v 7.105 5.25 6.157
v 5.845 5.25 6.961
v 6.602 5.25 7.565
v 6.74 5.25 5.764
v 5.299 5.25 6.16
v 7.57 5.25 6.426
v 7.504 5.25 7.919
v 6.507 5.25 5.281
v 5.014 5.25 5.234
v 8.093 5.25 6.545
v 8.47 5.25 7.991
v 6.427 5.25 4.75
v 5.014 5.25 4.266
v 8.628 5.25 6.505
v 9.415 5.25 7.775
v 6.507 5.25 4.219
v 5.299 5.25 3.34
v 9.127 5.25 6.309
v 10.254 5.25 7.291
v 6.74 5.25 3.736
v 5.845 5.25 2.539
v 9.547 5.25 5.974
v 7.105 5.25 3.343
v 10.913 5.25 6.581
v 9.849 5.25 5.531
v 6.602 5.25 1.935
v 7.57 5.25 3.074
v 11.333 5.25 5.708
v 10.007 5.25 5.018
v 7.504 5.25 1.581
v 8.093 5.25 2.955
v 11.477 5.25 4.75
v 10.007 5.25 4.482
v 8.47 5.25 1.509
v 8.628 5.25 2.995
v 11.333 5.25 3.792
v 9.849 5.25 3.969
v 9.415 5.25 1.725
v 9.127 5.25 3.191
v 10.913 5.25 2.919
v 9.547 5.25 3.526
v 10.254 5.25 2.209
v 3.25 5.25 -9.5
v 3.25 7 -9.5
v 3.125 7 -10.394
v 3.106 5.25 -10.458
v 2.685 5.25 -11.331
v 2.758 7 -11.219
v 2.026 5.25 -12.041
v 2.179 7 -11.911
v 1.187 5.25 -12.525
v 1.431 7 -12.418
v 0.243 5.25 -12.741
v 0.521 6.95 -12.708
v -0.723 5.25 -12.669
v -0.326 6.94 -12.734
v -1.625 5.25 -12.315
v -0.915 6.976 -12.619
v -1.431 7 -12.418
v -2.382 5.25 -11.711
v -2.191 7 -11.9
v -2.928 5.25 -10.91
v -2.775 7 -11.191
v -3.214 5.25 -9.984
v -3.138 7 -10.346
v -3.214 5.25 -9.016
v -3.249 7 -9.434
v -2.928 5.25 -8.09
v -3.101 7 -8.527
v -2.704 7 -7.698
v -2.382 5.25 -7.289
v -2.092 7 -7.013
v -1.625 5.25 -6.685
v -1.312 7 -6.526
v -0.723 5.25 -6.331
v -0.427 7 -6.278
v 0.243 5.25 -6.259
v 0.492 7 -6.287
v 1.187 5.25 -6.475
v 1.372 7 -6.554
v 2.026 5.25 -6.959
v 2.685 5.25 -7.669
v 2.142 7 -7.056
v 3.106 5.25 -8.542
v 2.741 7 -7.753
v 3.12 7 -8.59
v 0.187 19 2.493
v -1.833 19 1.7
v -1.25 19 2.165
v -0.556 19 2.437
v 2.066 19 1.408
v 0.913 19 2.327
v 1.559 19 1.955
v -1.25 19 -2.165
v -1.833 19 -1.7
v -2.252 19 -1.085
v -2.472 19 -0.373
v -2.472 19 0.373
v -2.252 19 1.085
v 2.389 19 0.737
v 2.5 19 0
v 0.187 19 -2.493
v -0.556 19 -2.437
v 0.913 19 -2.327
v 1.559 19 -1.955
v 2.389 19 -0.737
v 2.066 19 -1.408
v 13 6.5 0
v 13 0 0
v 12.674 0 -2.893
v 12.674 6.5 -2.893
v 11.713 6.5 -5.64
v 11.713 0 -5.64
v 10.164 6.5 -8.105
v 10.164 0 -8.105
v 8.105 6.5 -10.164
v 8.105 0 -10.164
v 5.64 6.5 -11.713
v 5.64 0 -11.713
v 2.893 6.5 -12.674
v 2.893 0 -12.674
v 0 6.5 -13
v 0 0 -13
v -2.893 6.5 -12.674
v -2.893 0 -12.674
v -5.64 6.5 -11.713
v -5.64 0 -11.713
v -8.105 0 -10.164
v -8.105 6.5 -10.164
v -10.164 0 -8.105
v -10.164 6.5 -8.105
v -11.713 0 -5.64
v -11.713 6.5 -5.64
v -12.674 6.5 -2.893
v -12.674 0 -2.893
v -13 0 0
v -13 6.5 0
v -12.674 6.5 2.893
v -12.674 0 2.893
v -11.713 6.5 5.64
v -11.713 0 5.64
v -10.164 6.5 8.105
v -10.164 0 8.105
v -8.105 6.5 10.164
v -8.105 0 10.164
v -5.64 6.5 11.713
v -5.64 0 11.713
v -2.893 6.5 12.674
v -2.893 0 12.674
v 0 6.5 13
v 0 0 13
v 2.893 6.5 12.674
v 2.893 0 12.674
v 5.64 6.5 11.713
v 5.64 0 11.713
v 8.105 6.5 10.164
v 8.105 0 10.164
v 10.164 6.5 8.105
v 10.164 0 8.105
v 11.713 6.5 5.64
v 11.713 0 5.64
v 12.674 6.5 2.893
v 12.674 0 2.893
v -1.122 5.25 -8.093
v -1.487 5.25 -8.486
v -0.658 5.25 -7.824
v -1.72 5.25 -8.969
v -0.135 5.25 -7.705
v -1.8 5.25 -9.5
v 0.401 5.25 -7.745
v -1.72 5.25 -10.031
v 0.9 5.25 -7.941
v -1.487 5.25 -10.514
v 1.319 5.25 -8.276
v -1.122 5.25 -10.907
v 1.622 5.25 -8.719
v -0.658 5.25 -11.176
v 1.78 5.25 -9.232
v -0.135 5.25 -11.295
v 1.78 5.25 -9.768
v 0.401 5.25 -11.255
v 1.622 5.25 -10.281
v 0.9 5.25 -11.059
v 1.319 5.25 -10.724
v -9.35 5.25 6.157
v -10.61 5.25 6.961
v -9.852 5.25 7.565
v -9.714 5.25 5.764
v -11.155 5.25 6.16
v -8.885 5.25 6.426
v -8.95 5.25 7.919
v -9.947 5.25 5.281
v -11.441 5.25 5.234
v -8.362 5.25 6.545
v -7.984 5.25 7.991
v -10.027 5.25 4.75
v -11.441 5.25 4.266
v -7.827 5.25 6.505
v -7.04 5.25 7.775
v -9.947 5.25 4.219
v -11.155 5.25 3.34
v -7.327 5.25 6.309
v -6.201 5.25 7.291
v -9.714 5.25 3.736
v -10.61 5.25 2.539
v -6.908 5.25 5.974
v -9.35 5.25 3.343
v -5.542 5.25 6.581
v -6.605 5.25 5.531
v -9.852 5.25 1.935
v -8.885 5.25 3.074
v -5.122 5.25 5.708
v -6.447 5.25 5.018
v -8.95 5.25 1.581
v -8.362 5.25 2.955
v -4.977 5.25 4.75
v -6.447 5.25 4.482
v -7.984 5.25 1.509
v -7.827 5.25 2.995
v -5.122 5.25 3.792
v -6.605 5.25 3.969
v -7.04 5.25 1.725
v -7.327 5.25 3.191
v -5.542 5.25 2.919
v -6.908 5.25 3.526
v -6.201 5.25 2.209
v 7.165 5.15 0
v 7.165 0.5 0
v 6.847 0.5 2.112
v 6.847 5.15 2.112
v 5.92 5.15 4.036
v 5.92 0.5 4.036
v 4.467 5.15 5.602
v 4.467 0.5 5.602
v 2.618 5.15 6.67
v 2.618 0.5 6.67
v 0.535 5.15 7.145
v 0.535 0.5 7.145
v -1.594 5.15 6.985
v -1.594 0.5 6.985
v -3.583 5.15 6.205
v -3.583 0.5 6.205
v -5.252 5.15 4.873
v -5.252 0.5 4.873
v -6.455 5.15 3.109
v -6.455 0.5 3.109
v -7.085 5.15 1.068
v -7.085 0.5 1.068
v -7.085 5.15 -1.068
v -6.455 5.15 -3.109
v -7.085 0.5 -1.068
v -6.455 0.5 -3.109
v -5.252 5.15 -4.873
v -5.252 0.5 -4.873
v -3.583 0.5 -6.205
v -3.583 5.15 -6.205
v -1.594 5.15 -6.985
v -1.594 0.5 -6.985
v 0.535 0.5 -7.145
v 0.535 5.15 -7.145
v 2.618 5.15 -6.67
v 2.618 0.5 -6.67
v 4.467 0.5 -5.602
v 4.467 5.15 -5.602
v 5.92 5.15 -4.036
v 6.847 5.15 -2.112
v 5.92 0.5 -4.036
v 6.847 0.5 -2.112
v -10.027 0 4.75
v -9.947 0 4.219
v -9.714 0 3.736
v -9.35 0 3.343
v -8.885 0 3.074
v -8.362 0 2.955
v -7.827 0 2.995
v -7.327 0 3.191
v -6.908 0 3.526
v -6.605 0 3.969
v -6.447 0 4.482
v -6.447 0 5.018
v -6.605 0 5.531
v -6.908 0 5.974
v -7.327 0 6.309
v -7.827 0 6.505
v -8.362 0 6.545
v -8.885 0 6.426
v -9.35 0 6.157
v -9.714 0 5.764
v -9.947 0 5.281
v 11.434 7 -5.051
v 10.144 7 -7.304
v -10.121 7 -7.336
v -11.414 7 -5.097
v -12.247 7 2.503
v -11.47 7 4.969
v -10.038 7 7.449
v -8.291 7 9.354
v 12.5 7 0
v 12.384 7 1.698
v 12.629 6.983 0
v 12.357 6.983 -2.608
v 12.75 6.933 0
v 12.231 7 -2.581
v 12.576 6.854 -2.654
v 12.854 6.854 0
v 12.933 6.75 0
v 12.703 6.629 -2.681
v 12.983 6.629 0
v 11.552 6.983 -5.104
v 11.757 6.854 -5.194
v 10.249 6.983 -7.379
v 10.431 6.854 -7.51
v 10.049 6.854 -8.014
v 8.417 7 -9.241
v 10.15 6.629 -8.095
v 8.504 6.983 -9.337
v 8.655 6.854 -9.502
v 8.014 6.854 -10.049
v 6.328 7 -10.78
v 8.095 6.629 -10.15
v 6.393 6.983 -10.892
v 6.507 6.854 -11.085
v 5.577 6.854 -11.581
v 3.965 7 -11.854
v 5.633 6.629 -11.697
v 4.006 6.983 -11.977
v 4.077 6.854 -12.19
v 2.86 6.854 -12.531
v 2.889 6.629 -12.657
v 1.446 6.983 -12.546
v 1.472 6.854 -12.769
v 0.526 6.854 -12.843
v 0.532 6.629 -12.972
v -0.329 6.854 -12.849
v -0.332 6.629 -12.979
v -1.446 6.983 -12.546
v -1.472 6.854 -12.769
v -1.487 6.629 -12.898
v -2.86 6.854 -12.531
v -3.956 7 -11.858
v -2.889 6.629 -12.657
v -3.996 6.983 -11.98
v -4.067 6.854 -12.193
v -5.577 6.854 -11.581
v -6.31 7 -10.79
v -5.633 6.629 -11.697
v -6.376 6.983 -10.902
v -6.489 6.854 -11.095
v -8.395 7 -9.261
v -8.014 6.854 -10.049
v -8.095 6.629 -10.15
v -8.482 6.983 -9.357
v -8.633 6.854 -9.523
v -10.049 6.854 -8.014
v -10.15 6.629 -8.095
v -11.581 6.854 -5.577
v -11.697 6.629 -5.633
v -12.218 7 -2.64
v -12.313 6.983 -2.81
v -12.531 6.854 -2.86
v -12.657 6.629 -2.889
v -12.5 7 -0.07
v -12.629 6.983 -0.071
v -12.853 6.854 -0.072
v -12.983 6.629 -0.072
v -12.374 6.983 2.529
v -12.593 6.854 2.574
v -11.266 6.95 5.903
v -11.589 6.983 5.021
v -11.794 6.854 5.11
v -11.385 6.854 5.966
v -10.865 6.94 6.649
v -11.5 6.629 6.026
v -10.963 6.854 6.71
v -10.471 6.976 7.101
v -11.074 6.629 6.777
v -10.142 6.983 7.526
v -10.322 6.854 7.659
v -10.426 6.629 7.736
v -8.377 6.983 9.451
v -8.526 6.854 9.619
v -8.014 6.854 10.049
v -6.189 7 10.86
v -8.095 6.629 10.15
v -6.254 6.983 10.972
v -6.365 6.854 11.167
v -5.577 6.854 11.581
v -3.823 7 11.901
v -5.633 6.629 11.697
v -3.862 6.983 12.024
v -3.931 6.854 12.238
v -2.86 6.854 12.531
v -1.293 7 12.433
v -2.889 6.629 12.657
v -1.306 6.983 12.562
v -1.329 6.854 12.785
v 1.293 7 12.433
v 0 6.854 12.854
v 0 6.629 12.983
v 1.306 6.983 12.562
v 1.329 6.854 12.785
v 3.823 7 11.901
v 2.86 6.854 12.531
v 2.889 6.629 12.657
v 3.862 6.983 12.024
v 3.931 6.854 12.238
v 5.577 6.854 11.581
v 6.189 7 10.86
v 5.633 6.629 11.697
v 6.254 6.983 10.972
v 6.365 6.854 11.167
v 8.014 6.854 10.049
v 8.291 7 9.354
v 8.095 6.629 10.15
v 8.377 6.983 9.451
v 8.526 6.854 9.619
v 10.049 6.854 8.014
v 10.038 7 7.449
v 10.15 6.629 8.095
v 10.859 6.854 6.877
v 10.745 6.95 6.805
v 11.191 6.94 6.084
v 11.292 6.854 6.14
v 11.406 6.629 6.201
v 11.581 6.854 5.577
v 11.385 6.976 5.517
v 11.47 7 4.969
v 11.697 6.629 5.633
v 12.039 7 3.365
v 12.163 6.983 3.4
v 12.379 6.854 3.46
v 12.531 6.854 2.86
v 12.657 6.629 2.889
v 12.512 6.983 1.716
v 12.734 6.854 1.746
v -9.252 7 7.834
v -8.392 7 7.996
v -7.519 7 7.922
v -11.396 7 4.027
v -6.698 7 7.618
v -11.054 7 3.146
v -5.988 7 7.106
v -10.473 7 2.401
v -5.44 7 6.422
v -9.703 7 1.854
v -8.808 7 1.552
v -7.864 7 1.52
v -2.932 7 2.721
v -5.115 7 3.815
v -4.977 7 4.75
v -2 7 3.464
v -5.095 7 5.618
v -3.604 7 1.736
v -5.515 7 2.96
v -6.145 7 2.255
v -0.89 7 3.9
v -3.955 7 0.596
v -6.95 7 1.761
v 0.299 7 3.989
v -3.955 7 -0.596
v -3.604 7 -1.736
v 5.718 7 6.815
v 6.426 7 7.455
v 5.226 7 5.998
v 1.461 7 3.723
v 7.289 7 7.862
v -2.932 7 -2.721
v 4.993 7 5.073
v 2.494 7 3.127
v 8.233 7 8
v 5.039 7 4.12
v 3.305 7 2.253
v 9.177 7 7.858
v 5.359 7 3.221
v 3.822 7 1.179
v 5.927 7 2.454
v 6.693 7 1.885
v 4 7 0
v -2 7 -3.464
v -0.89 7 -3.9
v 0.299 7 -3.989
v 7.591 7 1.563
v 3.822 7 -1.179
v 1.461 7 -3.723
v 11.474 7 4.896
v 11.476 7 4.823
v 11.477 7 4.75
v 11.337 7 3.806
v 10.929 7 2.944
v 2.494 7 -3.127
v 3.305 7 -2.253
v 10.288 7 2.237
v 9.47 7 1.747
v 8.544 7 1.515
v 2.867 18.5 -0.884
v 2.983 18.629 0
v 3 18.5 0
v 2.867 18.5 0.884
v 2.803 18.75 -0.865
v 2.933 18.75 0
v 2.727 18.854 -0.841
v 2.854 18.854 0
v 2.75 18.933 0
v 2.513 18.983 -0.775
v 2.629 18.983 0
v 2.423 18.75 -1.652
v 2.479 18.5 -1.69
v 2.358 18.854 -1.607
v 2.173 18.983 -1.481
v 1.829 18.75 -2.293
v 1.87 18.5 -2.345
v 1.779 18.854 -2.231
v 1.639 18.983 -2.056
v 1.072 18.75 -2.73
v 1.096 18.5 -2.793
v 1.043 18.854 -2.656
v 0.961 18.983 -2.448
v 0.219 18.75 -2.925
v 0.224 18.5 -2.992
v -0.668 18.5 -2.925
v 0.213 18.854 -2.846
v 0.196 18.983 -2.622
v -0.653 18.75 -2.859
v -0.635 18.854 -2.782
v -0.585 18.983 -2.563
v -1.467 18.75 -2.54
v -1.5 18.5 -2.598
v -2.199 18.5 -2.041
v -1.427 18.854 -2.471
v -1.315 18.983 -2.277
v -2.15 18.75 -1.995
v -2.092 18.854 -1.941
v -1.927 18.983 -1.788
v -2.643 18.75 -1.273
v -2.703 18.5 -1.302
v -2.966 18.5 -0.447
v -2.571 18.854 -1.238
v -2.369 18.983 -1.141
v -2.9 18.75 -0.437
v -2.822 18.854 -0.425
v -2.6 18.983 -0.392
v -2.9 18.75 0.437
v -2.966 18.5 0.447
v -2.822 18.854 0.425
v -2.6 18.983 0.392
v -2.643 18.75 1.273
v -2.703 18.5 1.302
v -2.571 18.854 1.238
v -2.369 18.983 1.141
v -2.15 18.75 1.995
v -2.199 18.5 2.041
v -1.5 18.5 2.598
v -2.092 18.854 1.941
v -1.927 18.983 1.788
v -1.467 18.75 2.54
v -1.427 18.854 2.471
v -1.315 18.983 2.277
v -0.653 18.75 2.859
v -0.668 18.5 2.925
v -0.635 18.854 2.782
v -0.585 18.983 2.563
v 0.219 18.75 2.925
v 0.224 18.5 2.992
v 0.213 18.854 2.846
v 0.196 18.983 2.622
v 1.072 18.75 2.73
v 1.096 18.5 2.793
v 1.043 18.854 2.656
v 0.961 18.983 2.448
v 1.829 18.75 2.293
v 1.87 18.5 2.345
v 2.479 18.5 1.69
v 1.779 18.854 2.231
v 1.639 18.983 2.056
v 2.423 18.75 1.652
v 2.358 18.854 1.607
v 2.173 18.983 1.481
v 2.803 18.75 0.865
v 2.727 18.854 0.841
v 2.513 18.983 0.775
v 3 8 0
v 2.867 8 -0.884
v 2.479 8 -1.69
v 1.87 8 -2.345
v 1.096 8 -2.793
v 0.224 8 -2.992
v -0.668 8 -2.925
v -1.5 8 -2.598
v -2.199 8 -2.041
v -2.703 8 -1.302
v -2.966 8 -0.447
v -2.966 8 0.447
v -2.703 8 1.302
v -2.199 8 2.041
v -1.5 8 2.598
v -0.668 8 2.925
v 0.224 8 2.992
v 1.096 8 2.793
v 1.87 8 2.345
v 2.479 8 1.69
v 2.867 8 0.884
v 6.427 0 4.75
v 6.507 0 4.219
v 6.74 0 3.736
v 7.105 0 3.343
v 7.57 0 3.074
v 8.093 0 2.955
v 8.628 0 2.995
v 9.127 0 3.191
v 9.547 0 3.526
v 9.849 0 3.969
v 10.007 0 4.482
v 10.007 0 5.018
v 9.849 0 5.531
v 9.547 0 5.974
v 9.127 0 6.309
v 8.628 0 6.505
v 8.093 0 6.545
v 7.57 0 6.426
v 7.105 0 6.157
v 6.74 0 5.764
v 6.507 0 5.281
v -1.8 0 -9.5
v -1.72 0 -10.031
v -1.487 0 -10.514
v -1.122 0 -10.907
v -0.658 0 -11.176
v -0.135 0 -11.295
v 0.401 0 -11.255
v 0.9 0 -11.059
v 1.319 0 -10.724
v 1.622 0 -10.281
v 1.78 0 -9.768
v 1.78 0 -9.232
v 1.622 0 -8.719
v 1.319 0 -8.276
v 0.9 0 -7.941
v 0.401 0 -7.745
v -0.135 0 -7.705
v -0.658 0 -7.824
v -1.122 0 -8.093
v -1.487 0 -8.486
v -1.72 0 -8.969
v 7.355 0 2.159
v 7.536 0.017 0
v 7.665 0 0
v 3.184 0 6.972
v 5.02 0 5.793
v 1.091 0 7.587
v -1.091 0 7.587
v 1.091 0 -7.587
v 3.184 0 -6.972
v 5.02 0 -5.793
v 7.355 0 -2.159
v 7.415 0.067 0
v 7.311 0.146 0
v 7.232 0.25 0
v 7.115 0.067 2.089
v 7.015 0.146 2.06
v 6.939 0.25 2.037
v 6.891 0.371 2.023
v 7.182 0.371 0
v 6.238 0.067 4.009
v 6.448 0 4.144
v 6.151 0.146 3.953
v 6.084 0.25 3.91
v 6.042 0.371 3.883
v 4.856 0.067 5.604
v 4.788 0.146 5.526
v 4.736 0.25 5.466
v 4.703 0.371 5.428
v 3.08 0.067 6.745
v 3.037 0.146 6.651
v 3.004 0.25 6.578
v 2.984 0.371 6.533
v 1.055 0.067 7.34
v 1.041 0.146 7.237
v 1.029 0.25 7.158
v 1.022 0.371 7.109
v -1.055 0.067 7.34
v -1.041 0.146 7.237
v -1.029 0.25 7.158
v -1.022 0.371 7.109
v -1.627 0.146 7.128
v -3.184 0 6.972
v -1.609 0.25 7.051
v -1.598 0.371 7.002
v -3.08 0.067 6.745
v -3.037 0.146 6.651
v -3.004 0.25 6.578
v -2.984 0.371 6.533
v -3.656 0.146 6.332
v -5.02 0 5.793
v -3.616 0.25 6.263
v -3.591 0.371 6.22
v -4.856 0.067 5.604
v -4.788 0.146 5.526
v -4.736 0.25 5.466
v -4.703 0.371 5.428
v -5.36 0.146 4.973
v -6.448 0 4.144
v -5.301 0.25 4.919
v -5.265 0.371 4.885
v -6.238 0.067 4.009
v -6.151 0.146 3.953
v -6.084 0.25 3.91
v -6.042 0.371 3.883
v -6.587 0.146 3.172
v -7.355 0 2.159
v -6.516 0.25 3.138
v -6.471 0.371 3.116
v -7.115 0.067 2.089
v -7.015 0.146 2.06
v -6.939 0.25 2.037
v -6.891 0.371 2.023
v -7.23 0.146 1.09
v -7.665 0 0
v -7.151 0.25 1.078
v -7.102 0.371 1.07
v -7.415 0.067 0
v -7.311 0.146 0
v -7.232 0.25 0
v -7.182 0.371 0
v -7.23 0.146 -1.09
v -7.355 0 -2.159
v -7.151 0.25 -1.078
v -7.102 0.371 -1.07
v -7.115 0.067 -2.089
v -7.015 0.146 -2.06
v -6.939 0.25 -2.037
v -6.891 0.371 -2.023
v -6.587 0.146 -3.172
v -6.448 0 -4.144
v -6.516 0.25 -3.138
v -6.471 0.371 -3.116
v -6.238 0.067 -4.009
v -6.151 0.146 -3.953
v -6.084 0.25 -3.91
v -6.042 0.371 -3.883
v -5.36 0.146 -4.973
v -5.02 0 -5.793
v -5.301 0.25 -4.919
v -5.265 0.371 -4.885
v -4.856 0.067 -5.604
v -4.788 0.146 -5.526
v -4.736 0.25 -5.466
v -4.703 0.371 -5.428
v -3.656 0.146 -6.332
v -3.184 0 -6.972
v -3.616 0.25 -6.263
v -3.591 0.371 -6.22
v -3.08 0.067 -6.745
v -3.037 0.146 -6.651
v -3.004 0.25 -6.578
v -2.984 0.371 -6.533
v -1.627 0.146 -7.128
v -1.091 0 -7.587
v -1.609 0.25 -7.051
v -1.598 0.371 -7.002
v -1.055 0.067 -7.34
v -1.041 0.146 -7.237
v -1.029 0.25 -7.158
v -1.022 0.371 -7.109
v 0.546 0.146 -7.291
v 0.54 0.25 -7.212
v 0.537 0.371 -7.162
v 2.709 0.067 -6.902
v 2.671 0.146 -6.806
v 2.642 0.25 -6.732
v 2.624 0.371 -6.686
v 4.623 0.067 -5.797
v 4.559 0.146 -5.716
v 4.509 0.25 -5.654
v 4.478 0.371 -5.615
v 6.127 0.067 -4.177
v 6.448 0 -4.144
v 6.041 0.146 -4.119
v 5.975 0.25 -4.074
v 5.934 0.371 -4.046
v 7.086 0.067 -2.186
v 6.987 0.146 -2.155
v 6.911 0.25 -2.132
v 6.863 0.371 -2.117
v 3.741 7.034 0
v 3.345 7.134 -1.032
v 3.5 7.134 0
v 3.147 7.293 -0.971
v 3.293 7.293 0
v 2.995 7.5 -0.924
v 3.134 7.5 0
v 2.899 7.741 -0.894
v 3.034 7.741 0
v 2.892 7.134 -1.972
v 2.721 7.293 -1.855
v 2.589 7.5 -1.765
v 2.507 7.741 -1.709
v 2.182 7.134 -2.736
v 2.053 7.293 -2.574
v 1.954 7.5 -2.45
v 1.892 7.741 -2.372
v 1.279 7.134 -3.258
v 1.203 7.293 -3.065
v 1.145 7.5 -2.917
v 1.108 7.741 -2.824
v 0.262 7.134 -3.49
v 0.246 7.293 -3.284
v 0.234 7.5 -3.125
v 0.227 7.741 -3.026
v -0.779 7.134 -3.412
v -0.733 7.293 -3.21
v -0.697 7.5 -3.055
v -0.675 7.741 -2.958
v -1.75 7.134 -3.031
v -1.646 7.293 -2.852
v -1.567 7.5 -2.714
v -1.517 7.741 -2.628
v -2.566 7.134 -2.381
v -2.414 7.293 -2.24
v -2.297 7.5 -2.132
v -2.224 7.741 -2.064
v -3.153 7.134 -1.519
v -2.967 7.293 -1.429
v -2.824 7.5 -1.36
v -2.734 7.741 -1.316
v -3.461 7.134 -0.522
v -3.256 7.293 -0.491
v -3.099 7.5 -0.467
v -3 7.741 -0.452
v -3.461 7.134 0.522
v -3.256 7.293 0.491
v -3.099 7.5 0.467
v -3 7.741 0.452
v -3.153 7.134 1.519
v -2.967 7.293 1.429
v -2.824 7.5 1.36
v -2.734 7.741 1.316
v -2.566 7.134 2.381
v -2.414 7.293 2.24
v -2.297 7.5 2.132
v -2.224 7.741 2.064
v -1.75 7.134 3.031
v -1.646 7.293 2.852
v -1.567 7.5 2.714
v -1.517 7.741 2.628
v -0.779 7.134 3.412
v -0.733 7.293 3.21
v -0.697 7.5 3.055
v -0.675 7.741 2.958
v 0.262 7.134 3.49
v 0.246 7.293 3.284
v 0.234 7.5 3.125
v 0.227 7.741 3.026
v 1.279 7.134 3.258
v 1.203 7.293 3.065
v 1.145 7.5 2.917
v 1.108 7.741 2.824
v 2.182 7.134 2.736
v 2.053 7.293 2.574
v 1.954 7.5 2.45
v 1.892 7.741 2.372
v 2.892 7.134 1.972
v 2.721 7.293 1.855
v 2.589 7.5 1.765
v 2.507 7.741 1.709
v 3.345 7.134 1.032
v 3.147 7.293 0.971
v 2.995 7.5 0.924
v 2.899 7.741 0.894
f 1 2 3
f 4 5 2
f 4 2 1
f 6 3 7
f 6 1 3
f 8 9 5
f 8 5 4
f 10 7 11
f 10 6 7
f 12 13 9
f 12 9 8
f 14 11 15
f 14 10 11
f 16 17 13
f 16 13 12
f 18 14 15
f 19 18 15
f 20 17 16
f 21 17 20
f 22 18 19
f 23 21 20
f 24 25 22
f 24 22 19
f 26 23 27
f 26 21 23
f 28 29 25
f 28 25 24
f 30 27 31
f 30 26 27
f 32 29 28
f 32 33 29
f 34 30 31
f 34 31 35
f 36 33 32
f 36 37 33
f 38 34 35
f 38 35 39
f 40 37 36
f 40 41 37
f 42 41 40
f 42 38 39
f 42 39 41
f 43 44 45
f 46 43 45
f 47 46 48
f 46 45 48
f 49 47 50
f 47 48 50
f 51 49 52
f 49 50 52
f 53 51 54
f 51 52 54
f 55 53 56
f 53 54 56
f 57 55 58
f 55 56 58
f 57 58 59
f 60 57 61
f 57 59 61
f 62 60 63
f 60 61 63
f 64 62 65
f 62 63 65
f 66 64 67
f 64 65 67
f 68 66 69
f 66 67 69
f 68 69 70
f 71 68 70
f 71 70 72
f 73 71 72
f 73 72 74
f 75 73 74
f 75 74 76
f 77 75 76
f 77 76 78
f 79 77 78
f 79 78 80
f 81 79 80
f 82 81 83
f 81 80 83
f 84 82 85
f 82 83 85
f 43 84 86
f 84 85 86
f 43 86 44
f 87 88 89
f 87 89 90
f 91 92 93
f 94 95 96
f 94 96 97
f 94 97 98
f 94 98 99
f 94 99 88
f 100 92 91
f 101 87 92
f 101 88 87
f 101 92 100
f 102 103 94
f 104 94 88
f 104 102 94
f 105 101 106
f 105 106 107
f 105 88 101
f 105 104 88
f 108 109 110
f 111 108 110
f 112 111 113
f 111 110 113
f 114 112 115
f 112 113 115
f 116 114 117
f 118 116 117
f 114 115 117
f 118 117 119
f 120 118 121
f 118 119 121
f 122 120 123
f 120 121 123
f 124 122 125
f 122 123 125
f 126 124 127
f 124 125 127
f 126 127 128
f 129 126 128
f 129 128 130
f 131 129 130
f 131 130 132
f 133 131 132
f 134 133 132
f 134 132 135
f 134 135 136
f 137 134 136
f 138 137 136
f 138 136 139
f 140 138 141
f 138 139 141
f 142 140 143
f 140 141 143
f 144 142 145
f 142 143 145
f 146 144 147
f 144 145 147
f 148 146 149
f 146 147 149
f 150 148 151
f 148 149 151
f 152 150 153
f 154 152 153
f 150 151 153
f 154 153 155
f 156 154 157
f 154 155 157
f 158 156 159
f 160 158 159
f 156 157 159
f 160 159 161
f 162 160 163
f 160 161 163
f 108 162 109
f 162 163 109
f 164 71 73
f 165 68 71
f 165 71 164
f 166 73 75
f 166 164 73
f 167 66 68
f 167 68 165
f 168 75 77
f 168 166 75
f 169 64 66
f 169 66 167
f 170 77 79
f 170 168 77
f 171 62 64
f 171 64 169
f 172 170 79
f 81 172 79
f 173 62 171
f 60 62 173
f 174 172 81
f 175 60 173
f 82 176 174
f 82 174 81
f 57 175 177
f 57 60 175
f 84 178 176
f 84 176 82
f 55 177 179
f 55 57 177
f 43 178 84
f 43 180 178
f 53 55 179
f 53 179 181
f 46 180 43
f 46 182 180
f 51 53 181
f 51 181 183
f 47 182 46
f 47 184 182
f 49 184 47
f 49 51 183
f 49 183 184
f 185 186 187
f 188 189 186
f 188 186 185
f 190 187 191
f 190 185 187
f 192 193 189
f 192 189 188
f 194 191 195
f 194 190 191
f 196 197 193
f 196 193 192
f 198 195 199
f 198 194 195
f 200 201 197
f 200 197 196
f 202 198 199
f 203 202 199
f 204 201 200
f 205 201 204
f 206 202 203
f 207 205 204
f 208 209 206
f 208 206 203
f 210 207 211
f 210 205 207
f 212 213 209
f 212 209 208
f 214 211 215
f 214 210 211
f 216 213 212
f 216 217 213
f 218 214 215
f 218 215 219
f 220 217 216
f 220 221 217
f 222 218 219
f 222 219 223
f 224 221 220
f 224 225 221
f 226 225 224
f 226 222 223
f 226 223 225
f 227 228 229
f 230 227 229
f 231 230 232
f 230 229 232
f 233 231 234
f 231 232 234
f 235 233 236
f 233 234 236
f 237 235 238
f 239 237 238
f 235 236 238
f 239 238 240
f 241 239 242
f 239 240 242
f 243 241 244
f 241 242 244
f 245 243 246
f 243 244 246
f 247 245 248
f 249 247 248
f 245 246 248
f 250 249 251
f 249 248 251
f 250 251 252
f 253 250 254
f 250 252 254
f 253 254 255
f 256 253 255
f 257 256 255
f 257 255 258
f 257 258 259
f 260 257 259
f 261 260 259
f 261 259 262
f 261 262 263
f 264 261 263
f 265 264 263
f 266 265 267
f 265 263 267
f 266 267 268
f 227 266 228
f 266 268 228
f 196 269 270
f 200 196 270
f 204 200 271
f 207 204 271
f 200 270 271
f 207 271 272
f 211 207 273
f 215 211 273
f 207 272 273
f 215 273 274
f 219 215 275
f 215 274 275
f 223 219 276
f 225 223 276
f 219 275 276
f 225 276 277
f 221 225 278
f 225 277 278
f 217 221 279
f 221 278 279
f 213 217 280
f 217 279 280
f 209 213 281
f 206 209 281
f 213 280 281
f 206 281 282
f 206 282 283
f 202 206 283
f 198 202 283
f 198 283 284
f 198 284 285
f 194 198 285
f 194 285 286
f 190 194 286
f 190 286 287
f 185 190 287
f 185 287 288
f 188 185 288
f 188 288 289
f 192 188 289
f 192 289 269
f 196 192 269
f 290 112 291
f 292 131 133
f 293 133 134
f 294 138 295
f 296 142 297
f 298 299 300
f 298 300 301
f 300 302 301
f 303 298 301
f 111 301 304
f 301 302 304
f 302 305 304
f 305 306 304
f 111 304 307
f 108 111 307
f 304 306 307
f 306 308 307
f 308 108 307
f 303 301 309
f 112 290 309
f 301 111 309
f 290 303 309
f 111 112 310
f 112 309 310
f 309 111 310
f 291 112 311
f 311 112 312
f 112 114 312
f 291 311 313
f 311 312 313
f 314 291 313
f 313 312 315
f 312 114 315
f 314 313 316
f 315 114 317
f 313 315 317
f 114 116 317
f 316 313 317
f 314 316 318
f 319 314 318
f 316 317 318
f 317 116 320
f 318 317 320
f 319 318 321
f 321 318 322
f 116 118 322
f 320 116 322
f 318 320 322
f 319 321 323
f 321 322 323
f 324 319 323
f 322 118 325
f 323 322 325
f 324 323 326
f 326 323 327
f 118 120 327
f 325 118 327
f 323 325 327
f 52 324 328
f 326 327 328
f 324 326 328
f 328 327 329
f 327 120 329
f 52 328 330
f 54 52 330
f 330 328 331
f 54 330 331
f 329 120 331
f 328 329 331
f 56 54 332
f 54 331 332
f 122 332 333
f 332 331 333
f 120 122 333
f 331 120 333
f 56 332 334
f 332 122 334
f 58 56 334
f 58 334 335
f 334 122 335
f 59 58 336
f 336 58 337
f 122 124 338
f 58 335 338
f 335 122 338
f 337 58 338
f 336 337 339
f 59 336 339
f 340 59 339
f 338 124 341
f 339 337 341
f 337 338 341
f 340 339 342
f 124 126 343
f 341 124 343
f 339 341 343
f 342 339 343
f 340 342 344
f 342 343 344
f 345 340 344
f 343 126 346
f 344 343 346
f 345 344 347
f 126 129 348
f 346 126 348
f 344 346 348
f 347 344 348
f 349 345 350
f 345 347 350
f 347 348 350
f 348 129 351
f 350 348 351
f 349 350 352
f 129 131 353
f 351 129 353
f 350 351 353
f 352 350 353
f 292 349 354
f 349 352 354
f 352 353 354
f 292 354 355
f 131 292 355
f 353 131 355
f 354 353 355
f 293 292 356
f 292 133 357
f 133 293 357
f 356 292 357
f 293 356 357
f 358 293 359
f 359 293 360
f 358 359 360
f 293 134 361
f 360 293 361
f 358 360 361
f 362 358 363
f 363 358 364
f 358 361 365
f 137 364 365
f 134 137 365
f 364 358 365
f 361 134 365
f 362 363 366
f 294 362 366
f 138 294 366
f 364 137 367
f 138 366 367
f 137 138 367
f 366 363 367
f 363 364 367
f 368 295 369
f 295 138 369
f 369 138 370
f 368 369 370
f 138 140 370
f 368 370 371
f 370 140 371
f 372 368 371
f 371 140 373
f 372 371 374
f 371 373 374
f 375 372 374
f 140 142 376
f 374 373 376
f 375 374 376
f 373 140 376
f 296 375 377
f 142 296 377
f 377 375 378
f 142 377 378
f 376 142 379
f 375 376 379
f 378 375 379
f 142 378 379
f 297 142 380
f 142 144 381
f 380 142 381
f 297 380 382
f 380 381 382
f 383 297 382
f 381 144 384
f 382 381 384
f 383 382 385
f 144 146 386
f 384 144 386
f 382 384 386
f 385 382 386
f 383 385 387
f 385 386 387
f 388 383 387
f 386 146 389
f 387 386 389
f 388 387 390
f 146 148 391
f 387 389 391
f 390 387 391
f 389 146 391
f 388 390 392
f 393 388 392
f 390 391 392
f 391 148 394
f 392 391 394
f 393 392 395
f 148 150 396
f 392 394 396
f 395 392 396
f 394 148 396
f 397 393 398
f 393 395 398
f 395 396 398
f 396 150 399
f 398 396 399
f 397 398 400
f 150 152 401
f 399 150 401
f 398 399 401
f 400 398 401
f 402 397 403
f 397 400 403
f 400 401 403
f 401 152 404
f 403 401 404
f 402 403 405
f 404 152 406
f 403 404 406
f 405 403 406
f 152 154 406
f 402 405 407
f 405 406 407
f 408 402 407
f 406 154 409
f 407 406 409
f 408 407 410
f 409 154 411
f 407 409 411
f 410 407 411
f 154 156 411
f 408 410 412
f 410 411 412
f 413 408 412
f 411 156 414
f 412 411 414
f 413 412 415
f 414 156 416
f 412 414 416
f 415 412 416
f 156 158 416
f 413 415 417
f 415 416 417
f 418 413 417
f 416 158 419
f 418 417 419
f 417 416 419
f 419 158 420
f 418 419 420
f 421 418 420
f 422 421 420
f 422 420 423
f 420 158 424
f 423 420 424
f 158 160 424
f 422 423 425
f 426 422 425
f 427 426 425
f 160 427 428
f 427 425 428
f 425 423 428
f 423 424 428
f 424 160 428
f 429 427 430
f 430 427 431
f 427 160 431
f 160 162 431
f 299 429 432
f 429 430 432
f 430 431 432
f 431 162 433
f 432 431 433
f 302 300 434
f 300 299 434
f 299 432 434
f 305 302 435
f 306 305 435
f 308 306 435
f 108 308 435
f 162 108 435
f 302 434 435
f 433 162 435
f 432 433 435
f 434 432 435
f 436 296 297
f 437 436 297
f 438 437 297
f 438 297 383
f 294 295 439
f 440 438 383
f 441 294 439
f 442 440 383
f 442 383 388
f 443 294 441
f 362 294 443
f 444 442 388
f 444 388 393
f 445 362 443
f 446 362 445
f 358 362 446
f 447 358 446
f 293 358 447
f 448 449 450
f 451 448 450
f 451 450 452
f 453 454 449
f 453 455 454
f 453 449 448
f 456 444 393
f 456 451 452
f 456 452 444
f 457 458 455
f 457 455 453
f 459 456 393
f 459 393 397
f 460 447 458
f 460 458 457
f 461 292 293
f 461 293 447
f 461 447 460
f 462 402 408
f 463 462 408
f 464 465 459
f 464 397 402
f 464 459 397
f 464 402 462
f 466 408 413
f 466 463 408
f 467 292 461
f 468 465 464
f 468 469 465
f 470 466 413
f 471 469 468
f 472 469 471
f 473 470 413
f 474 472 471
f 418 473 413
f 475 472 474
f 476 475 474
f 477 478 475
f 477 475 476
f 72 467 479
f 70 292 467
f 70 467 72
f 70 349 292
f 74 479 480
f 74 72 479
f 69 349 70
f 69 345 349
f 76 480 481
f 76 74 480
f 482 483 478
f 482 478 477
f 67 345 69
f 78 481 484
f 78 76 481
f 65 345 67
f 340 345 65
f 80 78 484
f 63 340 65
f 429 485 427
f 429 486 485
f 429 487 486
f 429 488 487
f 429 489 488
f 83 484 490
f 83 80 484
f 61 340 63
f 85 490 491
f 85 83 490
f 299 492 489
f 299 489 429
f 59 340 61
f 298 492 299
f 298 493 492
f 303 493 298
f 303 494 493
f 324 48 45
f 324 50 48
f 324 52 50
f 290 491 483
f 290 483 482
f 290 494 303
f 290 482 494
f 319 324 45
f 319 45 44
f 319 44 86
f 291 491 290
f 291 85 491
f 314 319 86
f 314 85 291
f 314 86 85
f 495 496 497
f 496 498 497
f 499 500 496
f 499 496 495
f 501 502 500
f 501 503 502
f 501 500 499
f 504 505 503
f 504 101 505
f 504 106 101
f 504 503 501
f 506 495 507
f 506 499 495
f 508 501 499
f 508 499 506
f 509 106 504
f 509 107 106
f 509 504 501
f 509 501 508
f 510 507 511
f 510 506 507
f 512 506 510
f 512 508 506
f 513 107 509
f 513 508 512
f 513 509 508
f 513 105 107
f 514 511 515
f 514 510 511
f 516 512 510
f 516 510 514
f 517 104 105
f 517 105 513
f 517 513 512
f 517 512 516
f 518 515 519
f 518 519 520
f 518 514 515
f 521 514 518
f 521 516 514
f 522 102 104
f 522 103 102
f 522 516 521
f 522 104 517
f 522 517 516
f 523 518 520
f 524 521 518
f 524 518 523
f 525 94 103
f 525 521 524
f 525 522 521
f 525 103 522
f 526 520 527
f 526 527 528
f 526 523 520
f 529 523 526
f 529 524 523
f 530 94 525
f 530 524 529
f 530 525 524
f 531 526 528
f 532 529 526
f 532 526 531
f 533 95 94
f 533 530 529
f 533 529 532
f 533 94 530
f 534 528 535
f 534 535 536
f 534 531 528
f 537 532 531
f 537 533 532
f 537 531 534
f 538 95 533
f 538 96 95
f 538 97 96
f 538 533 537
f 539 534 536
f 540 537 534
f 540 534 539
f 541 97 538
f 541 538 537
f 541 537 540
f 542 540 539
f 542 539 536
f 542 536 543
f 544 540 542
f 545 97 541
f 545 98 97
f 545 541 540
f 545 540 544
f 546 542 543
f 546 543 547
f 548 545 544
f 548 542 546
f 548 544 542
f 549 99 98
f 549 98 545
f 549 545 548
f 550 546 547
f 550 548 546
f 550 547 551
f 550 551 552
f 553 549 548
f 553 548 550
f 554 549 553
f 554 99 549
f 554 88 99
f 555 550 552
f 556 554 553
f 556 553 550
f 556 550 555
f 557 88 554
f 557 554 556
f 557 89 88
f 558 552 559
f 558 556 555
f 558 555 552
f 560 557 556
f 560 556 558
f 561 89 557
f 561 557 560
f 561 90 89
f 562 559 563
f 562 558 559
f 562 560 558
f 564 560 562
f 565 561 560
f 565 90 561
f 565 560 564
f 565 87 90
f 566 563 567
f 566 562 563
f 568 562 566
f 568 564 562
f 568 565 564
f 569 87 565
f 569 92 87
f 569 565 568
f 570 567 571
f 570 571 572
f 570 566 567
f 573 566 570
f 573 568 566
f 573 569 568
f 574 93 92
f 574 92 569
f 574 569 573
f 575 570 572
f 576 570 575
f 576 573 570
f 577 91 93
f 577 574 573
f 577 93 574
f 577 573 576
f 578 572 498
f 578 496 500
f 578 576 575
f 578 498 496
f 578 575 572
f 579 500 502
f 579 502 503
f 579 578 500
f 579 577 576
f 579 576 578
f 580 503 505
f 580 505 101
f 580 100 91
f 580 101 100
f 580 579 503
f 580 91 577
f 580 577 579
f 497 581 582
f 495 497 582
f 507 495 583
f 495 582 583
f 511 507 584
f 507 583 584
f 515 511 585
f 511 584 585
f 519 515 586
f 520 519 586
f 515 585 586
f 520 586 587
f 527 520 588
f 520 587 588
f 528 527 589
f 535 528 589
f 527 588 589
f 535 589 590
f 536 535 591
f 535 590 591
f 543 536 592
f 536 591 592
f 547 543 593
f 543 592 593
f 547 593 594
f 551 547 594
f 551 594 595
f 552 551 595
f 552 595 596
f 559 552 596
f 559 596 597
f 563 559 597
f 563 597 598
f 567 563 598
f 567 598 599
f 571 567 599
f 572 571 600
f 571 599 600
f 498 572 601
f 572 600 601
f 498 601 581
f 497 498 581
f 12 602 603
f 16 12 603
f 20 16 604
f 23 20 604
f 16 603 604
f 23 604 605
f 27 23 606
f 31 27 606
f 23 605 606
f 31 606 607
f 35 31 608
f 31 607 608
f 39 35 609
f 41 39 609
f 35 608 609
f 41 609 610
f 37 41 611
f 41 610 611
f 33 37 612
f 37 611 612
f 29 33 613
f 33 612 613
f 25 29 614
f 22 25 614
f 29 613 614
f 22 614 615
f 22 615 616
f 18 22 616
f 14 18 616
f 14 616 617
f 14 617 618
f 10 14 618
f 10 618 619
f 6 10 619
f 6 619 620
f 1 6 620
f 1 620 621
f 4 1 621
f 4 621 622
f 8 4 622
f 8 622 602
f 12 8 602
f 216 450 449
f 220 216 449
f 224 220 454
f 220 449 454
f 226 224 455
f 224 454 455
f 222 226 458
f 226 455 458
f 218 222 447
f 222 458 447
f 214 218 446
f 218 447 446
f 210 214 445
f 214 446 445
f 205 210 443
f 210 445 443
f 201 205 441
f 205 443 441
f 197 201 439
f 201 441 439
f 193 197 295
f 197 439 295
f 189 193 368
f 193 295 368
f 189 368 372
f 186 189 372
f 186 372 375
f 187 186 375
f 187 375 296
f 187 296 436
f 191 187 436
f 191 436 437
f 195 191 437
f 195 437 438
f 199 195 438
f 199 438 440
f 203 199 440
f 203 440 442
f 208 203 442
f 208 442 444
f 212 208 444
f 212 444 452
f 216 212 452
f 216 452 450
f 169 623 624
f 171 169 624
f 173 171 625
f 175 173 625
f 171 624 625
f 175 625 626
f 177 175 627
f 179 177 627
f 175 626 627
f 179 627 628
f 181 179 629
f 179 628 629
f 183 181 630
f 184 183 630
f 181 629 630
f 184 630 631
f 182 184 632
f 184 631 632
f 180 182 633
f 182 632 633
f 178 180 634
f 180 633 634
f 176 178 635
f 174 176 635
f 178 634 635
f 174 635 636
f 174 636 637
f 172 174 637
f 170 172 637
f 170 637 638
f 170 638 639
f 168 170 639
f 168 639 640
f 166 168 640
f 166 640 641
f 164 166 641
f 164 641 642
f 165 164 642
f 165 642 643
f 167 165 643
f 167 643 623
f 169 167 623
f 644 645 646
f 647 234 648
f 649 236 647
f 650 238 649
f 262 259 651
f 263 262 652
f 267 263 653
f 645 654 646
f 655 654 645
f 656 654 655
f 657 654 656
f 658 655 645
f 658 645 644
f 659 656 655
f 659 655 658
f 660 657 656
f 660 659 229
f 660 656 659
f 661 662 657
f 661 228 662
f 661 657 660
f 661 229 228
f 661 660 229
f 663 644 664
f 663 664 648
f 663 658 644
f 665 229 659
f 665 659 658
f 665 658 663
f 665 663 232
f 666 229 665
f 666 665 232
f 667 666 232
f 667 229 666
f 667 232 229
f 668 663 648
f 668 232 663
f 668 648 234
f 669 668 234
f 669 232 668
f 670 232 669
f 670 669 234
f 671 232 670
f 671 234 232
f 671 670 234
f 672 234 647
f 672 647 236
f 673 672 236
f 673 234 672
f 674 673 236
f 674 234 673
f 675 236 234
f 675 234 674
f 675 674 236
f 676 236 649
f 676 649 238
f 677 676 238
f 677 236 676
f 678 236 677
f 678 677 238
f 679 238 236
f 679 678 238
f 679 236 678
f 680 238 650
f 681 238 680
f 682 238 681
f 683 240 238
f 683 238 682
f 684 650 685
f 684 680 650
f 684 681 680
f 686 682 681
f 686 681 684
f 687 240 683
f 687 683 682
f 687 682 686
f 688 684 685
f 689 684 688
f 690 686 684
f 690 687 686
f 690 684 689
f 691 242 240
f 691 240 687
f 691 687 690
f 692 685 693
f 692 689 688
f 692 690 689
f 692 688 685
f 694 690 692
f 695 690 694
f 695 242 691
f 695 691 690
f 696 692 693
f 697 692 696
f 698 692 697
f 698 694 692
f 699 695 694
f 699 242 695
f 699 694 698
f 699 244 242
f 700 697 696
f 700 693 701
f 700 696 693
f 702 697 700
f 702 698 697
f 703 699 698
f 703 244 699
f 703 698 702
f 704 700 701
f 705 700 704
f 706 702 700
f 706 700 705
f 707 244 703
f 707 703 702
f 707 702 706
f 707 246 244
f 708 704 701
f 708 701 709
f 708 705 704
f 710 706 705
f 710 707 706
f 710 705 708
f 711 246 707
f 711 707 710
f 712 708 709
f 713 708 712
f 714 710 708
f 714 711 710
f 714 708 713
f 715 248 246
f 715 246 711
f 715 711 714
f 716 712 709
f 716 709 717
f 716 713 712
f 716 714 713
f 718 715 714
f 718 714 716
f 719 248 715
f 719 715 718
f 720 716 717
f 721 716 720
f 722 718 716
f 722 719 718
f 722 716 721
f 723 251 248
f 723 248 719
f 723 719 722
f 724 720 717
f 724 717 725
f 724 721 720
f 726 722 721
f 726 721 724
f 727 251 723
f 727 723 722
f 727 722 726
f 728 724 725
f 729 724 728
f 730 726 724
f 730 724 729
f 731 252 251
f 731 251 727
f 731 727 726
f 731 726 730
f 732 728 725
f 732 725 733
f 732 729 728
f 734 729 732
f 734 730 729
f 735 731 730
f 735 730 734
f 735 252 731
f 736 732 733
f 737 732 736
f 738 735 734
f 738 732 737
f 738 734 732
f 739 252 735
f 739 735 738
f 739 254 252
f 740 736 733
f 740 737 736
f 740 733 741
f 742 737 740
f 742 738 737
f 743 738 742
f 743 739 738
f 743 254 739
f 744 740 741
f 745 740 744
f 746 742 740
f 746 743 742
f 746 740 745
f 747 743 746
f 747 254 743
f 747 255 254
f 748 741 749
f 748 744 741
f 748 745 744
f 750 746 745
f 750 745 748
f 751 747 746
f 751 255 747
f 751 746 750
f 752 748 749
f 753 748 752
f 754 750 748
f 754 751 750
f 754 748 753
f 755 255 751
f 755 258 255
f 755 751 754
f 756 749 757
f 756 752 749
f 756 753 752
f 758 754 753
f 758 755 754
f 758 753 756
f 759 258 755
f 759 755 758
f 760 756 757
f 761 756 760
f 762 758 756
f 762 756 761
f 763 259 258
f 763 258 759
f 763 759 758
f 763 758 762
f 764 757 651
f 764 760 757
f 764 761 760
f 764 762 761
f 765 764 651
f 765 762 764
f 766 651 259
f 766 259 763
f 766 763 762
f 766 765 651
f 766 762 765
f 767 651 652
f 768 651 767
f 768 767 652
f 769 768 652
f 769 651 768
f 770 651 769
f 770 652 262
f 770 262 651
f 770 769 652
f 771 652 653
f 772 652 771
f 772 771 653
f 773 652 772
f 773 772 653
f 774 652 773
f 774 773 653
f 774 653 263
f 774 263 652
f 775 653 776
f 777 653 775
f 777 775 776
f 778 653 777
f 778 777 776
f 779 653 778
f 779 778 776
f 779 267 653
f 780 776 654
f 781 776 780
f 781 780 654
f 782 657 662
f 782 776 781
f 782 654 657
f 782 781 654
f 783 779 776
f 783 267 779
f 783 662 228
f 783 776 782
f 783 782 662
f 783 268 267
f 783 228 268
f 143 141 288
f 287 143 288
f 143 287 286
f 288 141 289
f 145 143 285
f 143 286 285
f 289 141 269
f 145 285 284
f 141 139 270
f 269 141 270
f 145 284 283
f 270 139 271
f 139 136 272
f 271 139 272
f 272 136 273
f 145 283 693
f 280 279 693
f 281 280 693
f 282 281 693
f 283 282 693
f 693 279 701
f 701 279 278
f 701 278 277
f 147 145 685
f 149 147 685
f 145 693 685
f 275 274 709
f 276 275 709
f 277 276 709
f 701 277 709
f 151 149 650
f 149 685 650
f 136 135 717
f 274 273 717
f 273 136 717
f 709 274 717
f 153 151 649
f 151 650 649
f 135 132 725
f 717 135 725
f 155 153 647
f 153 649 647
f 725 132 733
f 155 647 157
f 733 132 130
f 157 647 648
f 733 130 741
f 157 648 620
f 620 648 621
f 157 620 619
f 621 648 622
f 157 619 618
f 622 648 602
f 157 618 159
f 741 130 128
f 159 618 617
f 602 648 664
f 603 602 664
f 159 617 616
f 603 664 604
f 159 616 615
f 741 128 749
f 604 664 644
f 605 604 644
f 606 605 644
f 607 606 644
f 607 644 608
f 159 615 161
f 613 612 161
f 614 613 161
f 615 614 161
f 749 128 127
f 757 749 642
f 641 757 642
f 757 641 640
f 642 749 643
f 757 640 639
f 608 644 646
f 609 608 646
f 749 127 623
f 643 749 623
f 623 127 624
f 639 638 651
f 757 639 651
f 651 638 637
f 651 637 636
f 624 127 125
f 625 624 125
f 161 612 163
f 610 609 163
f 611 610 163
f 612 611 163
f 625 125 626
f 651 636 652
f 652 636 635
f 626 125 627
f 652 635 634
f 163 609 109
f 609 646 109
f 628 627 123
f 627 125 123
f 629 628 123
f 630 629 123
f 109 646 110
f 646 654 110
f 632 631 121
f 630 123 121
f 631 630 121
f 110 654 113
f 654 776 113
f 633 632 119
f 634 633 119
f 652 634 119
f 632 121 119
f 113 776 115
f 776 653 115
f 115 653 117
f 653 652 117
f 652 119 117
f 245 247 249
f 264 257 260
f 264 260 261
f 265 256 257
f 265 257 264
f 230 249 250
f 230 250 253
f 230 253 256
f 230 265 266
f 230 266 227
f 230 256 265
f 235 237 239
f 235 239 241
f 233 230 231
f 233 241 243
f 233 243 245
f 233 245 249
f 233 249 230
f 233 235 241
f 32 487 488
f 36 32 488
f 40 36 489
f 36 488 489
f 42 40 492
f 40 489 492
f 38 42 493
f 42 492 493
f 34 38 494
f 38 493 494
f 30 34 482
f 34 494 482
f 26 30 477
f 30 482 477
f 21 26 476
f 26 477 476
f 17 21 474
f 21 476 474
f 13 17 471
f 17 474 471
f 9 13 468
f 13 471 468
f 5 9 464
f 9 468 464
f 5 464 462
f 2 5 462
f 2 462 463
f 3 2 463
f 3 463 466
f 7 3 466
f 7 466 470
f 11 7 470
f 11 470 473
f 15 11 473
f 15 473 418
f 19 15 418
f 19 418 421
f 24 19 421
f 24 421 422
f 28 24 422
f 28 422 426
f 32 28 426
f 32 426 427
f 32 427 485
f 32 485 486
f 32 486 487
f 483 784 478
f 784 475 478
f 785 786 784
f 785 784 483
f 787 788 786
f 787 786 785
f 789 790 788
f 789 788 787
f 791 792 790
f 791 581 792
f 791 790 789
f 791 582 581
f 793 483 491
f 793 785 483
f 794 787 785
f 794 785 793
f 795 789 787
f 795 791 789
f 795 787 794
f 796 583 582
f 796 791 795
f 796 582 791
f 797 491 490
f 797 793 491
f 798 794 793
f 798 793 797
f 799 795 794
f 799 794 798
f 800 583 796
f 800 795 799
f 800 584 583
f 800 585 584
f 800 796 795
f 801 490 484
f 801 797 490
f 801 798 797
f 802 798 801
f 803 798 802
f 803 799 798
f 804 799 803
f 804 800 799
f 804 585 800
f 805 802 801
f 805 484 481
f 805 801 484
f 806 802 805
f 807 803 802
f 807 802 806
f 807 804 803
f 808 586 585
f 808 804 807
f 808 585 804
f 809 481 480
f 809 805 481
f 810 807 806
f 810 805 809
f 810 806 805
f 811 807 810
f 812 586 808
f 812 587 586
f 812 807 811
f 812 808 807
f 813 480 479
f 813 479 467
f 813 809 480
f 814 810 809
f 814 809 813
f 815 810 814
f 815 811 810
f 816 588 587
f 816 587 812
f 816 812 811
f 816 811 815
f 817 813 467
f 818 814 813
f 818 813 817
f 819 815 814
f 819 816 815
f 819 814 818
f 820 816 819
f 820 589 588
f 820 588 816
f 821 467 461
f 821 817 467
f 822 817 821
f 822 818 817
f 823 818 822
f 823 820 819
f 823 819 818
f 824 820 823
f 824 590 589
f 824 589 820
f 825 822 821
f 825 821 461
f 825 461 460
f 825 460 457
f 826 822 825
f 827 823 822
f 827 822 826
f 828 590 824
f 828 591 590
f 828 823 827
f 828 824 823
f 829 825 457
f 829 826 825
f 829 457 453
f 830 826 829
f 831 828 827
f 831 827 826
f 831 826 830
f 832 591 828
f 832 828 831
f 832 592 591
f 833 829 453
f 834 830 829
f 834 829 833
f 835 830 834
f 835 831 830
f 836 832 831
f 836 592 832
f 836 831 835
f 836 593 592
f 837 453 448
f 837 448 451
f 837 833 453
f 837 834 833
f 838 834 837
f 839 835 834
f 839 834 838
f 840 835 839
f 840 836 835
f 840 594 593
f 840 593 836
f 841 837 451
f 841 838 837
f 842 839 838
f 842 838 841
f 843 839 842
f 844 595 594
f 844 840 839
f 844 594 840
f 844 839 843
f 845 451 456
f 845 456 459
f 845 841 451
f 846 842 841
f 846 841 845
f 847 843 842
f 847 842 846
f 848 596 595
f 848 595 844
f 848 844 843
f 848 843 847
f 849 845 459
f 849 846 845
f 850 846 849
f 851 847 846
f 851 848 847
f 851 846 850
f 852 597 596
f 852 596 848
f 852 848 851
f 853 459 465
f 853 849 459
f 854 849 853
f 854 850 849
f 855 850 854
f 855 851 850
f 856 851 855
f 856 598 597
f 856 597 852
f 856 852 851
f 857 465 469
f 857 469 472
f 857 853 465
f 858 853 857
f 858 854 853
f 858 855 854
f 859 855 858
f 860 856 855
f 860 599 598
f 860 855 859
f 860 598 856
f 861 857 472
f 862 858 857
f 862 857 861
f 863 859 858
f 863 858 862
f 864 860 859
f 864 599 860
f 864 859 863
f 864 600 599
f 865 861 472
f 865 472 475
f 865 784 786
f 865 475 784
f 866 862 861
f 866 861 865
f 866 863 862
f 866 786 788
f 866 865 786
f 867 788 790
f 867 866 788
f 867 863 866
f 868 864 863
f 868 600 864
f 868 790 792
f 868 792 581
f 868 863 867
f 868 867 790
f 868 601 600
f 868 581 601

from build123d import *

# Parameters (mm, degrees)
SKETCH1_R                      = 13
BOSS_EXTRUDE1_DEPTH            = 7
SKETCH2_R                      = 7.165
CUT_EXTRUDE1_DEPTH             = 5.15
SKETCH3_R                      = 3
BOSS_EXTRUDE2_DEPTH            = 12
FILLET1_R                      = 1
FILLET1_2_R                    = 0.5
CBORE_FOR_M3_SHCS1_D           = 3.6
CBORE_FOR_M3_SHCS1_DEPTH       = 7
CBORE_FOR_M3_SHCS1_CBORE_D     = 6.5
CBORE_FOR_M3_SHCS1_CBORE_DEPTH = 1.75
FILLET2_R                      = 0.5


with BuildPart() as part:
    # Sketch1 → Boss-Extrude1 (new body)
    with BuildSketch(Plane(origin=(0, 0, 0), x_dir=(1, 0, 0), z_dir=(0, 1, 0))):
        Circle(SKETCH1_R)
    extrude(amount=BOSS_EXTRUDE1_DEPTH)

    # Sketch2 → Cut-Extrude1 (cut)
    with BuildSketch(Plane.XZ):
        Circle(SKETCH2_R)
    extrude(amount=-CUT_EXTRUDE1_DEPTH, mode=Mode.SUBTRACT)

    # Sketch3 → Boss-Extrude2 (add)
    with BuildSketch(Plane(origin=(0, 7, 0), x_dir=(1, 0, 0), z_dir=(0, 1, 0))):
        Circle(SKETCH3_R)
    extrude(amount=BOSS_EXTRUDE2_DEPTH)

    # Fillet1
    fillet1_edges = [part.edges().sort_by_distance(p)[0] for p in [
        (-3, 7, 0),
    ]]
    fillet(fillet1_edges, radius=FILLET1_R)

    # Fillet1 2
    fillet1_2_edges = [part.edges().sort_by_distance(p)[0] for p in [
        (-13, 7, 0),
    ]]
    fillet(fillet1_2_edges, radius=FILLET1_2_R)

    # CBORE for M3 SHCS1
    with Locations(Plane(origin=(0, 7, 0), x_dir=(1, 0, 0), z_dir=(0, 1, 0))):
        with Locations((0, 9.5), (8.227241336, -4.75), (-8.227241336, -4.75)):
            CounterBoreHole(CBORE_FOR_M3_SHCS1_D / 2, CBORE_FOR_M3_SHCS1_CBORE_D / 2, CBORE_FOR_M3_SHCS1_CBORE_DEPTH, depth=CBORE_FOR_M3_SHCS1_DEPTH)

    # Fillet2
    fillet2_edges = [part.edges().sort_by_distance(p)[0] for p in [
        (-3, 19, 0),
        (-7.165, 0, 0),
    ]]
    fillet(fillet2_edges, radius=FILLET2_R)


solid = part.part
